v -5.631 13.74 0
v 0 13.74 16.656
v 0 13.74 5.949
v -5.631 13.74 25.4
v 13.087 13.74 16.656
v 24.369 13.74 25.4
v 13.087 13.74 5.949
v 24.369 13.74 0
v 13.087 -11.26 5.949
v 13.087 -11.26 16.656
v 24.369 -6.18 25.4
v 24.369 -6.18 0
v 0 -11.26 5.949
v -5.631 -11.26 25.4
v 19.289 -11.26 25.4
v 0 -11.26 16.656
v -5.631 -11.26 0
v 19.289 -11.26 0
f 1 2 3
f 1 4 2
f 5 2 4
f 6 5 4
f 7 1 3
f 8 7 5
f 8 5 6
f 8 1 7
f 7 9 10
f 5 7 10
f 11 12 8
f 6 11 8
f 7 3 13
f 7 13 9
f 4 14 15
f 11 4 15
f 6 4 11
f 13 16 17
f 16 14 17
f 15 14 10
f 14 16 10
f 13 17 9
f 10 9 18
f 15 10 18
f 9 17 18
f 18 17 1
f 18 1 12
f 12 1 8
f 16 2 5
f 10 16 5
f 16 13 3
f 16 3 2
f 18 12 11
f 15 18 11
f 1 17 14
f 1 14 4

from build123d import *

# Parameters (mm, degrees)
F0_W     = 30
F0_H     = 25
F1_DEPTH = 25.4
F2_SIZE  = 5.08
F3_W     = 13.087139
F3_H     = 10.707659
F4_DEPTH = 35.941


with BuildPart() as f1:
    # F0 (on Top) → F1 (new body)
    with BuildSketch(Plane.XY):
        with Locations((9.369201, 1.240393)):
            Rectangle(F0_W, F0_H)
    extrude(amount=F1_DEPTH)

    # F2
    f2_edges = [f1.edges().sort_by_distance(p)[0] for p in [
        (24.369201, -11.259607, 12.7),
    ]]
    chamfer(f2_edges, length=F2_SIZE)

    # F3 (on face) → F4 (cut)
    with BuildSketch(Plane.XZ.offset(11.259607)):
        with Locations((6.543569, 11.302529)):
            Rectangle(F3_W, F3_H)
    extrude(amount=-F4_DEPTH, mode=Mode.SUBTRACT)


solid = f1.part
